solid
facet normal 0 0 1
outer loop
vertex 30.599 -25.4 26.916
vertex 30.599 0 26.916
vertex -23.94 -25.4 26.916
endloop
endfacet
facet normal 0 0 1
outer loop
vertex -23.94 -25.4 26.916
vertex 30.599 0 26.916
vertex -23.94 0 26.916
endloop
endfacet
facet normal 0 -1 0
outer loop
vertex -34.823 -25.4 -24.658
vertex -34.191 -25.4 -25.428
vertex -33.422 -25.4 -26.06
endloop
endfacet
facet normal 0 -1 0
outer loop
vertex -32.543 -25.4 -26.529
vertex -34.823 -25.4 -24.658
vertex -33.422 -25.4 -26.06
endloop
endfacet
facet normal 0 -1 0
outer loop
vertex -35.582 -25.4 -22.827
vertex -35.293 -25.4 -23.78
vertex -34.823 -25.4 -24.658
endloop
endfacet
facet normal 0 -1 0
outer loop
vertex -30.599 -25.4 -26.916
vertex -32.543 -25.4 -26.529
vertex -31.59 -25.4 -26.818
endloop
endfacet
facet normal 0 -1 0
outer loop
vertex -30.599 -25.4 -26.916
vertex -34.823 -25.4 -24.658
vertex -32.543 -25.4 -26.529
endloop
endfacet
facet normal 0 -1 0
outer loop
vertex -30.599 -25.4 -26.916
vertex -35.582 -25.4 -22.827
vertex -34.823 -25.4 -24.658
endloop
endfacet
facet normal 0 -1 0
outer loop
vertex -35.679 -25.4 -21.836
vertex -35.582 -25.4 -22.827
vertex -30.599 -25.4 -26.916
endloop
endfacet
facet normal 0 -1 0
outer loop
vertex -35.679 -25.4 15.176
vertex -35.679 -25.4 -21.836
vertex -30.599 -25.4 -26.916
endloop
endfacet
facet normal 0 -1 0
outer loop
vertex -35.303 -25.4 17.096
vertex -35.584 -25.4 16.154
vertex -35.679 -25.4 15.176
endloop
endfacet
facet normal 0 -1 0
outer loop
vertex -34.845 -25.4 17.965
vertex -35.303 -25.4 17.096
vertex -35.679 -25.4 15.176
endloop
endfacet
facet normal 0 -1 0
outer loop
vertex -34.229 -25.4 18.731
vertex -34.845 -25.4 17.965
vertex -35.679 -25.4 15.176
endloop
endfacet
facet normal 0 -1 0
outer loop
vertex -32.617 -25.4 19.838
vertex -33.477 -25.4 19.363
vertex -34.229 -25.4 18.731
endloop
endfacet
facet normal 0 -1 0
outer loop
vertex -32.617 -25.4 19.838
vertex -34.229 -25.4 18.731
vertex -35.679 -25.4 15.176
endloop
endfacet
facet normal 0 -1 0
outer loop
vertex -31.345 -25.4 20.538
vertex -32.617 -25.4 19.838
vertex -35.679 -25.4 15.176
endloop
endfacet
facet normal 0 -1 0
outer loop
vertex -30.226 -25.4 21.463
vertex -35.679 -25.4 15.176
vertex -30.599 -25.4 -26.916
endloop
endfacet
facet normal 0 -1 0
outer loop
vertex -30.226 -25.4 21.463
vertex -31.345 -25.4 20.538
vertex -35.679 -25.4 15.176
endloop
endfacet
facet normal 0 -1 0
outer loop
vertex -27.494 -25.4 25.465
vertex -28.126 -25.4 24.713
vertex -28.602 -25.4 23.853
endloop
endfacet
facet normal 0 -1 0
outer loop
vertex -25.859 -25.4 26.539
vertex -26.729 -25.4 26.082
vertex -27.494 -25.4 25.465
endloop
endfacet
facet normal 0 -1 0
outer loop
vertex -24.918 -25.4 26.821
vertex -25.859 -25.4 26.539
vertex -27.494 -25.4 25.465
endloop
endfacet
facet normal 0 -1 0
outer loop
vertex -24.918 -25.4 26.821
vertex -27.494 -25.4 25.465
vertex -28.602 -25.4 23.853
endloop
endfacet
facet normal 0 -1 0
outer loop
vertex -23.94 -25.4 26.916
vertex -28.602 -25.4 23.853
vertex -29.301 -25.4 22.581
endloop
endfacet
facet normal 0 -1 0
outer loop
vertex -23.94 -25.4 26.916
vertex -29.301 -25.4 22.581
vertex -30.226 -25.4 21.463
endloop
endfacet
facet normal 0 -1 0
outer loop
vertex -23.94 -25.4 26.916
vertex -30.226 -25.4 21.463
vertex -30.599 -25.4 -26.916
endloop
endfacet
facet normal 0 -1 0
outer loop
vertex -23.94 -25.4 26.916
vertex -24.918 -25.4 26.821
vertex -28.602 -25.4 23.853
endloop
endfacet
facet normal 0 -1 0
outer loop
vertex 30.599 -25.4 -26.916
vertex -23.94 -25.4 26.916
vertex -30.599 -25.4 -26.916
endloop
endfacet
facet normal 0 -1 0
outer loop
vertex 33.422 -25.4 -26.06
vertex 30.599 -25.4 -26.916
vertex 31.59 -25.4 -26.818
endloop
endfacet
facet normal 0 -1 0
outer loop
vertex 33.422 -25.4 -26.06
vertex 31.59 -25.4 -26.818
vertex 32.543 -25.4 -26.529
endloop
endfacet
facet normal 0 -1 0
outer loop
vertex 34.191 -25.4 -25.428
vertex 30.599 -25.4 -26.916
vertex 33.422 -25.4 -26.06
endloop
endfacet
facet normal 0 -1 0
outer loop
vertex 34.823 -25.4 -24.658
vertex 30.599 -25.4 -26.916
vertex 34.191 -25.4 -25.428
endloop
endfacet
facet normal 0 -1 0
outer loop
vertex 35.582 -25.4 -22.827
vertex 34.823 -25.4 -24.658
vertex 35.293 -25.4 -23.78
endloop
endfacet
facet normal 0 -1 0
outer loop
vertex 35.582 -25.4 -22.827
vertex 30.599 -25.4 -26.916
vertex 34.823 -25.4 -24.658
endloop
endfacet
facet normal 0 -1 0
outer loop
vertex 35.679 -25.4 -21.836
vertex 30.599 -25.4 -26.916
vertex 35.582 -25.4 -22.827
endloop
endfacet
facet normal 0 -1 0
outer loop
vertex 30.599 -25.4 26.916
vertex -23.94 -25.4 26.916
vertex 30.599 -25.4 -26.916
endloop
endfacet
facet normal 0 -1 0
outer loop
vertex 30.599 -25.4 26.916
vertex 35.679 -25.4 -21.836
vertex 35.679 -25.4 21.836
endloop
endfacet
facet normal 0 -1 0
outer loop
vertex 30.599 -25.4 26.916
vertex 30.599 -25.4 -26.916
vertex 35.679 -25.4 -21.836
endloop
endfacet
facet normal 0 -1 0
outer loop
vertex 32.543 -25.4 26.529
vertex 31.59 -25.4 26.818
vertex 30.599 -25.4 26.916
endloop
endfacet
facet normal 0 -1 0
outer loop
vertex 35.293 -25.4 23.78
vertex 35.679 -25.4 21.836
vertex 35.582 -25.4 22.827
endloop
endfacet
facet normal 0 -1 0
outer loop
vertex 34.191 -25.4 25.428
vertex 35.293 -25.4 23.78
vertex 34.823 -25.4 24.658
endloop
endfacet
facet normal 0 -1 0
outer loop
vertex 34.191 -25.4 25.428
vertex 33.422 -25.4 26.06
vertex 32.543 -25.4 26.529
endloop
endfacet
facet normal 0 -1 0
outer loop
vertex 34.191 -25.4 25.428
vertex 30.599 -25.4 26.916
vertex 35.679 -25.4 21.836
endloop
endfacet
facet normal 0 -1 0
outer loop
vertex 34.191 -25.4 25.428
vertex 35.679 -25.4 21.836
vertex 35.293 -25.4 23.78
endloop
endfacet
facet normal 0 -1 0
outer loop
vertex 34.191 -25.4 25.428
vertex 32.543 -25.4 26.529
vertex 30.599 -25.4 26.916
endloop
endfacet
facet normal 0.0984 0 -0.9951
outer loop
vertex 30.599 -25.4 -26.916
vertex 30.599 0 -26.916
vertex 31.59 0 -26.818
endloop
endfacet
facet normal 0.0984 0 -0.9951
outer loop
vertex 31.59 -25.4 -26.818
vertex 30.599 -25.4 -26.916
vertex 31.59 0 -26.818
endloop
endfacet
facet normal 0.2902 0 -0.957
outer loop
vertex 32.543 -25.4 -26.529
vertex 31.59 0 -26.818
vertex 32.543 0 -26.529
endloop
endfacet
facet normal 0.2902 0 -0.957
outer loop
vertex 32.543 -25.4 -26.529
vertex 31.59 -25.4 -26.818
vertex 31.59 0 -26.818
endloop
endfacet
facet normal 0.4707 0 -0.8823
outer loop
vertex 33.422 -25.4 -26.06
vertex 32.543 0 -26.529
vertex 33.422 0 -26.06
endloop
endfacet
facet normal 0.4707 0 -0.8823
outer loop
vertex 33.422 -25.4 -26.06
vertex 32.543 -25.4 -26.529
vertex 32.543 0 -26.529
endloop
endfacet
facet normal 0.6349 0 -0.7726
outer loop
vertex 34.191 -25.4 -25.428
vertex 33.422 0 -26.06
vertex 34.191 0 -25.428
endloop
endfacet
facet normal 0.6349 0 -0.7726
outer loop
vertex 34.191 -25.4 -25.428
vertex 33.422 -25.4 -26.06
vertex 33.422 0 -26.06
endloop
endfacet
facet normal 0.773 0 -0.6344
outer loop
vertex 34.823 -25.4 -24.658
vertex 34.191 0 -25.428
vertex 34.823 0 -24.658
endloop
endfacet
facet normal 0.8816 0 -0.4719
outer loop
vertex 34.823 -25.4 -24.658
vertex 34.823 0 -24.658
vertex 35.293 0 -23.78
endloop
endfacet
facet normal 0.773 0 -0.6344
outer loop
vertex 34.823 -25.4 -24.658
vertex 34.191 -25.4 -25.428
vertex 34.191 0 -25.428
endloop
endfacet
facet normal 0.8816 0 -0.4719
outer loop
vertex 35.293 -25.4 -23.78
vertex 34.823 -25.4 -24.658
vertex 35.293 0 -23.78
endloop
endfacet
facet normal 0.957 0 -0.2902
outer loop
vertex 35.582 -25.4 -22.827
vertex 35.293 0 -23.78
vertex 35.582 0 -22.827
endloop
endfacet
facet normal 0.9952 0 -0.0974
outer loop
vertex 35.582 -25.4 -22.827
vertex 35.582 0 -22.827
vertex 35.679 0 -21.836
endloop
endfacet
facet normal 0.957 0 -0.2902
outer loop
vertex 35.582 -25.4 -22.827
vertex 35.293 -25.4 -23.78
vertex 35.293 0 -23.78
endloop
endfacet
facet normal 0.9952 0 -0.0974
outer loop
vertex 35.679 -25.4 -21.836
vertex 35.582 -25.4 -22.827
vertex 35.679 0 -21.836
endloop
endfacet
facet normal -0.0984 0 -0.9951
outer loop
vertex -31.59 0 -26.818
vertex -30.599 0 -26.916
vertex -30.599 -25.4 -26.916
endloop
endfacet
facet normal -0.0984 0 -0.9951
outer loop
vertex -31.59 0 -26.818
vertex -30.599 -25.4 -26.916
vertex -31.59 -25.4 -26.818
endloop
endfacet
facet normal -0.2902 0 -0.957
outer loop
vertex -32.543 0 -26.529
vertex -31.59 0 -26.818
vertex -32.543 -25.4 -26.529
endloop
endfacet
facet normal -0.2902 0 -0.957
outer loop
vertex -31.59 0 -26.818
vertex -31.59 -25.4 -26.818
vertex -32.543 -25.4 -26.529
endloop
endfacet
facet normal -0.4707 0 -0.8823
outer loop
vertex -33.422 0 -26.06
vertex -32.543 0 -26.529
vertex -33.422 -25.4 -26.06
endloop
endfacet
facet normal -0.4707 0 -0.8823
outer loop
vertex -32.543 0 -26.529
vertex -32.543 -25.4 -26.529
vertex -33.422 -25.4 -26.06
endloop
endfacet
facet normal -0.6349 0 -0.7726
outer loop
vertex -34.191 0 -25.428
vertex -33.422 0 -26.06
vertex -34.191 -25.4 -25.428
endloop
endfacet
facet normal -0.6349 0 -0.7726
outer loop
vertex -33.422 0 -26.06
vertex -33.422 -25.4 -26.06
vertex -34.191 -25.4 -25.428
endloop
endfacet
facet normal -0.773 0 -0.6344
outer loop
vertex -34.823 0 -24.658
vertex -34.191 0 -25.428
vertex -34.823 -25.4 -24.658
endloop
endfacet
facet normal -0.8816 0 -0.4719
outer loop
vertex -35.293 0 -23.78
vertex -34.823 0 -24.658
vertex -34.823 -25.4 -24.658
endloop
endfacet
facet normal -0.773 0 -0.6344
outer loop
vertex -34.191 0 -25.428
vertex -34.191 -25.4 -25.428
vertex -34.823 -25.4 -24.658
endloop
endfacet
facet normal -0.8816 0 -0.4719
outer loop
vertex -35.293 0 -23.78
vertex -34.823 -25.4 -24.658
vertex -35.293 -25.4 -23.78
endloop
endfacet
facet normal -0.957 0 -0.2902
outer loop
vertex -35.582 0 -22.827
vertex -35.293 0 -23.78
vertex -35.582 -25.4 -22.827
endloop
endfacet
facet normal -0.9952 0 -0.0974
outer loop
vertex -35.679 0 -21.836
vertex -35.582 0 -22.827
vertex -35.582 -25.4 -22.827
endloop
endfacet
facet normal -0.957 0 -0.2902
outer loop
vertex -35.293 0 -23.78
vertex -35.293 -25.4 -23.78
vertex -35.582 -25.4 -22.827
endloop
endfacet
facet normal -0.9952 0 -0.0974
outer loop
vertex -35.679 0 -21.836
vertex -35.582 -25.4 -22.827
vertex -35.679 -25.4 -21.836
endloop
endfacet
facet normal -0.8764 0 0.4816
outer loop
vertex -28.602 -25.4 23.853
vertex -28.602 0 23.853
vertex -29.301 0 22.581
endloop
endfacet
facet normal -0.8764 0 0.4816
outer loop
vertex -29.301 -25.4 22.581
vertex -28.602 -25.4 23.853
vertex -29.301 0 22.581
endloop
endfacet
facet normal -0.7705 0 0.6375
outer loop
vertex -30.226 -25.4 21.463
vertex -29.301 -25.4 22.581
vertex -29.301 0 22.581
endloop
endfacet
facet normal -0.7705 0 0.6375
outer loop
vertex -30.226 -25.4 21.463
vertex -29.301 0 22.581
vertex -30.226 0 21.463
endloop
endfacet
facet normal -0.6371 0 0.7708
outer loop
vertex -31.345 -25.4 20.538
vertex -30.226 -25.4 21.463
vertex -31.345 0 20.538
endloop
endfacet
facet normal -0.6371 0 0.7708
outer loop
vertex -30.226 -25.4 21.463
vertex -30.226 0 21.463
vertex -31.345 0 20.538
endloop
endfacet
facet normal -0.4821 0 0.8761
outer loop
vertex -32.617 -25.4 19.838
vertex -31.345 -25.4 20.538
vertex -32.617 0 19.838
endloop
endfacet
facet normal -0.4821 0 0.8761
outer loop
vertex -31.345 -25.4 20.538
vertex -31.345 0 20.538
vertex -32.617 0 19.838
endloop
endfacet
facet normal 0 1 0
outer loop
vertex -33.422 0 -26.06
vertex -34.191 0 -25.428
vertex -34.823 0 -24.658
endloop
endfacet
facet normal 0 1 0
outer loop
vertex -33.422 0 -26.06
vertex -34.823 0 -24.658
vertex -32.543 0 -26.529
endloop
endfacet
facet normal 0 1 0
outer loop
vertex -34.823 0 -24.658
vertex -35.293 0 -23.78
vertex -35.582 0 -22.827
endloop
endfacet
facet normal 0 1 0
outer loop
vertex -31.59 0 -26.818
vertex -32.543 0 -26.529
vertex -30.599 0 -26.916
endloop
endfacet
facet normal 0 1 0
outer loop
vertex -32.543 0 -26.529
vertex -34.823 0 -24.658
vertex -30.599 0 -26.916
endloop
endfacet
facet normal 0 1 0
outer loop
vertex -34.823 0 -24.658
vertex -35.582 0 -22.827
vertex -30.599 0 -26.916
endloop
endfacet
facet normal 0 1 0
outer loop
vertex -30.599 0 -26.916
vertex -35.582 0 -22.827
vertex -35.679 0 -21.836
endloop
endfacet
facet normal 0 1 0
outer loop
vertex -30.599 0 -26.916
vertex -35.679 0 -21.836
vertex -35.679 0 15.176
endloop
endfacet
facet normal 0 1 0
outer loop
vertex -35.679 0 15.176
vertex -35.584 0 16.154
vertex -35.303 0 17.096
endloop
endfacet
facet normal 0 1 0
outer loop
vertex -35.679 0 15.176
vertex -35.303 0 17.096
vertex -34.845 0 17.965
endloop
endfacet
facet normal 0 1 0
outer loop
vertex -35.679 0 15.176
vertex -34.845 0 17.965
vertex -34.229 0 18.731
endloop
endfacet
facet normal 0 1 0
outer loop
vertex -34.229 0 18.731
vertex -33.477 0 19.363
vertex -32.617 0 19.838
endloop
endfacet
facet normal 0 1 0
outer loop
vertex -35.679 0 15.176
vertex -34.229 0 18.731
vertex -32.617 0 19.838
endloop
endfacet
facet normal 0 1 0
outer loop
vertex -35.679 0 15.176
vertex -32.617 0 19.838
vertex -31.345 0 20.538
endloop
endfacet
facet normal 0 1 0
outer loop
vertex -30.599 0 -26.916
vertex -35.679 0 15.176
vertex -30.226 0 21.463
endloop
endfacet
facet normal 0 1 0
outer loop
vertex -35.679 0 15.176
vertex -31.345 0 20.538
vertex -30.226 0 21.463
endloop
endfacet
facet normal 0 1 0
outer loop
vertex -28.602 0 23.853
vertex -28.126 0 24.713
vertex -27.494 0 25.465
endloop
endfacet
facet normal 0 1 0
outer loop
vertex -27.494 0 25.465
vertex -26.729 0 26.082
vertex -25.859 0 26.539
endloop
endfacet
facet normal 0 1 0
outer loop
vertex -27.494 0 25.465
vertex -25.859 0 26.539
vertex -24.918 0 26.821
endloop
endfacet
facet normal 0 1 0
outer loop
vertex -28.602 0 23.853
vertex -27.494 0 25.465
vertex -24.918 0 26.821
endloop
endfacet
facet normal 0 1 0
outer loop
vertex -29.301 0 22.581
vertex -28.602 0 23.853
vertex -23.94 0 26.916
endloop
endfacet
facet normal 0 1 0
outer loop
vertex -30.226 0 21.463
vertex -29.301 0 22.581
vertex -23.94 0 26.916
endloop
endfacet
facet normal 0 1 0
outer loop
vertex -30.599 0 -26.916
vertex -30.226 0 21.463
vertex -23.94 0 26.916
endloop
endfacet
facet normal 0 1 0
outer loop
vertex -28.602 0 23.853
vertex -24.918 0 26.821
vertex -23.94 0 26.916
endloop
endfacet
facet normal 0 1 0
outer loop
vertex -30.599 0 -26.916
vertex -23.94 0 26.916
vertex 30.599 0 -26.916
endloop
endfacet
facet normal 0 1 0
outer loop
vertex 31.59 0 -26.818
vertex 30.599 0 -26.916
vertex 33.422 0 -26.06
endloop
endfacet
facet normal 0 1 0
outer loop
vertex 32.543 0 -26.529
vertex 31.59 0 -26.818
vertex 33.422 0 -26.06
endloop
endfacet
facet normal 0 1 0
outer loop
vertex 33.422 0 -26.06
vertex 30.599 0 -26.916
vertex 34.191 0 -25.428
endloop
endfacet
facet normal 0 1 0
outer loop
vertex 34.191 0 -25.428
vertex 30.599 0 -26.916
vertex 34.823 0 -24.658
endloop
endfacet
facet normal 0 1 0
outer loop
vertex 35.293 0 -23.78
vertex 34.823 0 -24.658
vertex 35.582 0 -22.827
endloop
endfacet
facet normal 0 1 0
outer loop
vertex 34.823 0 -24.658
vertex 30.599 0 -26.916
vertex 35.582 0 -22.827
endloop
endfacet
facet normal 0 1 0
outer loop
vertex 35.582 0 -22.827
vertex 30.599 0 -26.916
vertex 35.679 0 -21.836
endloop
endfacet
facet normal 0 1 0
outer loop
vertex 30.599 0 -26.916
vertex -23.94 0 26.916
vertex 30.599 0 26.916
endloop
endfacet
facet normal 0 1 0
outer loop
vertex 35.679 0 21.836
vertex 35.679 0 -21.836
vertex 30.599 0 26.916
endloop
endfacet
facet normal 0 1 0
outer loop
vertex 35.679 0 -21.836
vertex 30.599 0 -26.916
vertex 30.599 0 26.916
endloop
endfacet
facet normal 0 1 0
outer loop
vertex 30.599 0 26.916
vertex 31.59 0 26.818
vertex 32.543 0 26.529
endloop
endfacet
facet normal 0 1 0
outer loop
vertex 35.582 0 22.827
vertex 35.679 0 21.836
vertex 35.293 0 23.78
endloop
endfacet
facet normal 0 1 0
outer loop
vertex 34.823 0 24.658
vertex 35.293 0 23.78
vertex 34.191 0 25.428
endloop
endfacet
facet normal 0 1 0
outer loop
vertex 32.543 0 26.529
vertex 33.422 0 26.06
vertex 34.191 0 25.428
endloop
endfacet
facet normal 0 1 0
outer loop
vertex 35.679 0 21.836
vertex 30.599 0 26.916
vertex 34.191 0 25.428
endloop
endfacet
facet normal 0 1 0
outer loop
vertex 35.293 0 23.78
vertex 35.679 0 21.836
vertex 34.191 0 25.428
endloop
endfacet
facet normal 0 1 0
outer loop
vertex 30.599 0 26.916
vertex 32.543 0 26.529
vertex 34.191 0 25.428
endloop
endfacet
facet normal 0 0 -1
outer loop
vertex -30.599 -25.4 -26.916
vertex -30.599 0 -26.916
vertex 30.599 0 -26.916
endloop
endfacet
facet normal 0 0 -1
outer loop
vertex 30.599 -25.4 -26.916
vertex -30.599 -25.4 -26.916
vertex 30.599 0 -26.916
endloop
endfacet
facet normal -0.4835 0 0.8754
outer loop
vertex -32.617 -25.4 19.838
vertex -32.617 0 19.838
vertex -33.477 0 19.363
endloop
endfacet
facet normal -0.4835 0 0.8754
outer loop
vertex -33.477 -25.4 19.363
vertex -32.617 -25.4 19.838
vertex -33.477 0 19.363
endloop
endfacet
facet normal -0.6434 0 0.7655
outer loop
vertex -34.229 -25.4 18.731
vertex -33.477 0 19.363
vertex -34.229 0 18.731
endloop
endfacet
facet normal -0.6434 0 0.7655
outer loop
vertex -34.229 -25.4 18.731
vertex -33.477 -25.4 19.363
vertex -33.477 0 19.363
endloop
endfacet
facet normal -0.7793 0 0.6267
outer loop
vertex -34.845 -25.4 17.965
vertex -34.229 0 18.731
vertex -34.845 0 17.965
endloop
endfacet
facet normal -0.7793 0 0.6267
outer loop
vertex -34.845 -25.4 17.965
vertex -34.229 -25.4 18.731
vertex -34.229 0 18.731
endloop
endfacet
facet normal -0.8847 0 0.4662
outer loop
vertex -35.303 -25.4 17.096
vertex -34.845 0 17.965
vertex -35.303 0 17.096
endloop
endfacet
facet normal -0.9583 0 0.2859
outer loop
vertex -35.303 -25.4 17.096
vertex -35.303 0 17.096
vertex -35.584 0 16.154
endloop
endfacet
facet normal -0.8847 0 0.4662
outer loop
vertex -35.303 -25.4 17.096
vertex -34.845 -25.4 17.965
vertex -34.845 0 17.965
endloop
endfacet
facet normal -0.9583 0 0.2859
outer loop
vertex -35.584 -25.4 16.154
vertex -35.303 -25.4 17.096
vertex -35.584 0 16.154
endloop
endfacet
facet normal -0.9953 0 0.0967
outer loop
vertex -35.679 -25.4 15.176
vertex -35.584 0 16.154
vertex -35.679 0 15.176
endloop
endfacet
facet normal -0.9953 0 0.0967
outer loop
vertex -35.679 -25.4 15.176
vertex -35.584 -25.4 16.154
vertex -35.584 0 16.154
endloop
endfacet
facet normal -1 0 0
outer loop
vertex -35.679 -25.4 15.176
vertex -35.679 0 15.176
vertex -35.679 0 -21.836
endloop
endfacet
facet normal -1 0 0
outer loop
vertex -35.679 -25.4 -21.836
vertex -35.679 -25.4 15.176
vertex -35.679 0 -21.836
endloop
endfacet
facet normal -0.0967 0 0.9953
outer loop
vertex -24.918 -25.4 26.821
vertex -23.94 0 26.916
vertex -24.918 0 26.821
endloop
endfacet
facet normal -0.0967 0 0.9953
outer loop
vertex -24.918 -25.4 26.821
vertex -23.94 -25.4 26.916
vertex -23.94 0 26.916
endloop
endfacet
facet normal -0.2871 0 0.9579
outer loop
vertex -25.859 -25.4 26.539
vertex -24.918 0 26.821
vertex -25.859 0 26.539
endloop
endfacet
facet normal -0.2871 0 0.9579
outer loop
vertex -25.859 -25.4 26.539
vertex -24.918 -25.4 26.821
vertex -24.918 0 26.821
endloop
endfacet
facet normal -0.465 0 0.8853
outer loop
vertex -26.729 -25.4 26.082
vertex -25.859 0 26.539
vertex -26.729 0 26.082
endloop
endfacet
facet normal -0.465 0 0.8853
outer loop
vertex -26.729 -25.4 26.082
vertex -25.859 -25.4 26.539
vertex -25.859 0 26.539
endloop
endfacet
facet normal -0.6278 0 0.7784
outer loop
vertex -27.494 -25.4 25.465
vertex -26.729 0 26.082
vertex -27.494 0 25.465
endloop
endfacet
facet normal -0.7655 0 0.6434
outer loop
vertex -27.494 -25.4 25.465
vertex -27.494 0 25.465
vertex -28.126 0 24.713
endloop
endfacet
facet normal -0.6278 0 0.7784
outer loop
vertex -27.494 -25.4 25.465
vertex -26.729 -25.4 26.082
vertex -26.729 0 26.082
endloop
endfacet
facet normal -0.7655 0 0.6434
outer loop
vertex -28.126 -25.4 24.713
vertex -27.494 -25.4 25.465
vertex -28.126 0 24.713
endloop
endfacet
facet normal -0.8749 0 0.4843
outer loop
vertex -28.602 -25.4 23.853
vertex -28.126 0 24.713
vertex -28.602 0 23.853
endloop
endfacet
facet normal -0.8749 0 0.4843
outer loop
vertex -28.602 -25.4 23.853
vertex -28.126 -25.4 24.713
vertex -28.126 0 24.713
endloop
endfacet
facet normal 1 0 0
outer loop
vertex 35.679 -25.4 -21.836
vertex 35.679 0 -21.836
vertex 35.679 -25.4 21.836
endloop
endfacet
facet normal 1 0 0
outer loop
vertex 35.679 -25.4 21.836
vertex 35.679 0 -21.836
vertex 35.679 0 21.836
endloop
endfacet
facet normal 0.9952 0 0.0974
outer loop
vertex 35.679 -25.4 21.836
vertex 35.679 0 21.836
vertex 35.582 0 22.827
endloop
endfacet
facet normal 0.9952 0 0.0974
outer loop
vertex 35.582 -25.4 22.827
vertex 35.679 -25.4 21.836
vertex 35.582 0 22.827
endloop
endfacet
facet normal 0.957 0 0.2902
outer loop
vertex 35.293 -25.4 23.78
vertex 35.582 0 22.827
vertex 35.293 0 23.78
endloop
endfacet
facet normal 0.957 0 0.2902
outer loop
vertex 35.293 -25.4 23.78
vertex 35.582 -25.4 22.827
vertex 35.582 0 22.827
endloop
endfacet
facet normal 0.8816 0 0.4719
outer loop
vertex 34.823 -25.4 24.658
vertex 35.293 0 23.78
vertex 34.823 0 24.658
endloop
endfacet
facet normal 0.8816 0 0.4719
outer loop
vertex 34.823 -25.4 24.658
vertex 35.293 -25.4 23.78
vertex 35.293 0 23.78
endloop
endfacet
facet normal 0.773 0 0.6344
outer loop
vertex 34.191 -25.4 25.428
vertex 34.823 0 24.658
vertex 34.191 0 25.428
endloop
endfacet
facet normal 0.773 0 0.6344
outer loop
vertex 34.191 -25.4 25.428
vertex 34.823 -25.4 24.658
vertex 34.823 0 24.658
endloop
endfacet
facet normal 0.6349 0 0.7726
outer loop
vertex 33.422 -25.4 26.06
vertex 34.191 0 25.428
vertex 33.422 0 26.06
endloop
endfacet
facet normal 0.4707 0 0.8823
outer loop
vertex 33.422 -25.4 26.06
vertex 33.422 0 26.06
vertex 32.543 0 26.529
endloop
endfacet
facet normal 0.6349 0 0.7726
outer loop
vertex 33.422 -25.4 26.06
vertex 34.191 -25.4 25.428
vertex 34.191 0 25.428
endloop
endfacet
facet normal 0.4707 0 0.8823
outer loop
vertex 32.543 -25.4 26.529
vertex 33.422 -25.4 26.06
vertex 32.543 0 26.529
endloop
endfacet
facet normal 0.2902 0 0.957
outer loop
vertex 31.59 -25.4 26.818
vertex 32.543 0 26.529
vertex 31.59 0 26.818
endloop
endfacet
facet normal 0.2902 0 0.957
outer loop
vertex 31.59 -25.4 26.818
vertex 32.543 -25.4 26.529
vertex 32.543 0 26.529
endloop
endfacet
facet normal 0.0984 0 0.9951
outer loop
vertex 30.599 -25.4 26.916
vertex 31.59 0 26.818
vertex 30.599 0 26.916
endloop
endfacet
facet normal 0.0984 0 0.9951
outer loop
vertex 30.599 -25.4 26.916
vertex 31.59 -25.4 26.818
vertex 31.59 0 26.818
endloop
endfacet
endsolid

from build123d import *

# Parameters (mm, degrees)
F1_DEPTH = 25.4
F2_R     = 5.08


with BuildPart() as f1:
    # F0 (on Front) → F1 (new body)
    with BuildSketch(Plane.XZ):
        with BuildLine():
            Line((-35.6792770326, -26.9159432501), (35.6792770326, -26.9159432501))
            Line((35.6792770326, -26.9159432501), (35.6792770326, 26.9159432501))
            Line((35.6792770326, 26.9159432501), (-27.9675787613, 26.9159432501))
            ThreePointArc((-27.9675787613, 26.9159432501), (-30.2262828905, 21.462949108), (-35.6792770326, 19.2042449788))
            Line((-35.6792770326, 19.2042449788), (-35.6792770326, -26.9159432501))
        make_face()
    extrude(amount=F1_DEPTH)

    # F2
    f2_edges = [f1.edges().sort_by_distance(p)[0] for p in [
        (35.679277, -12.7, 26.915943),
        (-35.679277, -12.7, -26.915943),
        (35.679277, -12.7, -26.915943),
        (-35.679277, -12.7, 19.204245),
        (-27.967579, -12.7, 26.915943),
    ]]
    fillet(f2_edges, radius=F2_R)


solid = f1.part
